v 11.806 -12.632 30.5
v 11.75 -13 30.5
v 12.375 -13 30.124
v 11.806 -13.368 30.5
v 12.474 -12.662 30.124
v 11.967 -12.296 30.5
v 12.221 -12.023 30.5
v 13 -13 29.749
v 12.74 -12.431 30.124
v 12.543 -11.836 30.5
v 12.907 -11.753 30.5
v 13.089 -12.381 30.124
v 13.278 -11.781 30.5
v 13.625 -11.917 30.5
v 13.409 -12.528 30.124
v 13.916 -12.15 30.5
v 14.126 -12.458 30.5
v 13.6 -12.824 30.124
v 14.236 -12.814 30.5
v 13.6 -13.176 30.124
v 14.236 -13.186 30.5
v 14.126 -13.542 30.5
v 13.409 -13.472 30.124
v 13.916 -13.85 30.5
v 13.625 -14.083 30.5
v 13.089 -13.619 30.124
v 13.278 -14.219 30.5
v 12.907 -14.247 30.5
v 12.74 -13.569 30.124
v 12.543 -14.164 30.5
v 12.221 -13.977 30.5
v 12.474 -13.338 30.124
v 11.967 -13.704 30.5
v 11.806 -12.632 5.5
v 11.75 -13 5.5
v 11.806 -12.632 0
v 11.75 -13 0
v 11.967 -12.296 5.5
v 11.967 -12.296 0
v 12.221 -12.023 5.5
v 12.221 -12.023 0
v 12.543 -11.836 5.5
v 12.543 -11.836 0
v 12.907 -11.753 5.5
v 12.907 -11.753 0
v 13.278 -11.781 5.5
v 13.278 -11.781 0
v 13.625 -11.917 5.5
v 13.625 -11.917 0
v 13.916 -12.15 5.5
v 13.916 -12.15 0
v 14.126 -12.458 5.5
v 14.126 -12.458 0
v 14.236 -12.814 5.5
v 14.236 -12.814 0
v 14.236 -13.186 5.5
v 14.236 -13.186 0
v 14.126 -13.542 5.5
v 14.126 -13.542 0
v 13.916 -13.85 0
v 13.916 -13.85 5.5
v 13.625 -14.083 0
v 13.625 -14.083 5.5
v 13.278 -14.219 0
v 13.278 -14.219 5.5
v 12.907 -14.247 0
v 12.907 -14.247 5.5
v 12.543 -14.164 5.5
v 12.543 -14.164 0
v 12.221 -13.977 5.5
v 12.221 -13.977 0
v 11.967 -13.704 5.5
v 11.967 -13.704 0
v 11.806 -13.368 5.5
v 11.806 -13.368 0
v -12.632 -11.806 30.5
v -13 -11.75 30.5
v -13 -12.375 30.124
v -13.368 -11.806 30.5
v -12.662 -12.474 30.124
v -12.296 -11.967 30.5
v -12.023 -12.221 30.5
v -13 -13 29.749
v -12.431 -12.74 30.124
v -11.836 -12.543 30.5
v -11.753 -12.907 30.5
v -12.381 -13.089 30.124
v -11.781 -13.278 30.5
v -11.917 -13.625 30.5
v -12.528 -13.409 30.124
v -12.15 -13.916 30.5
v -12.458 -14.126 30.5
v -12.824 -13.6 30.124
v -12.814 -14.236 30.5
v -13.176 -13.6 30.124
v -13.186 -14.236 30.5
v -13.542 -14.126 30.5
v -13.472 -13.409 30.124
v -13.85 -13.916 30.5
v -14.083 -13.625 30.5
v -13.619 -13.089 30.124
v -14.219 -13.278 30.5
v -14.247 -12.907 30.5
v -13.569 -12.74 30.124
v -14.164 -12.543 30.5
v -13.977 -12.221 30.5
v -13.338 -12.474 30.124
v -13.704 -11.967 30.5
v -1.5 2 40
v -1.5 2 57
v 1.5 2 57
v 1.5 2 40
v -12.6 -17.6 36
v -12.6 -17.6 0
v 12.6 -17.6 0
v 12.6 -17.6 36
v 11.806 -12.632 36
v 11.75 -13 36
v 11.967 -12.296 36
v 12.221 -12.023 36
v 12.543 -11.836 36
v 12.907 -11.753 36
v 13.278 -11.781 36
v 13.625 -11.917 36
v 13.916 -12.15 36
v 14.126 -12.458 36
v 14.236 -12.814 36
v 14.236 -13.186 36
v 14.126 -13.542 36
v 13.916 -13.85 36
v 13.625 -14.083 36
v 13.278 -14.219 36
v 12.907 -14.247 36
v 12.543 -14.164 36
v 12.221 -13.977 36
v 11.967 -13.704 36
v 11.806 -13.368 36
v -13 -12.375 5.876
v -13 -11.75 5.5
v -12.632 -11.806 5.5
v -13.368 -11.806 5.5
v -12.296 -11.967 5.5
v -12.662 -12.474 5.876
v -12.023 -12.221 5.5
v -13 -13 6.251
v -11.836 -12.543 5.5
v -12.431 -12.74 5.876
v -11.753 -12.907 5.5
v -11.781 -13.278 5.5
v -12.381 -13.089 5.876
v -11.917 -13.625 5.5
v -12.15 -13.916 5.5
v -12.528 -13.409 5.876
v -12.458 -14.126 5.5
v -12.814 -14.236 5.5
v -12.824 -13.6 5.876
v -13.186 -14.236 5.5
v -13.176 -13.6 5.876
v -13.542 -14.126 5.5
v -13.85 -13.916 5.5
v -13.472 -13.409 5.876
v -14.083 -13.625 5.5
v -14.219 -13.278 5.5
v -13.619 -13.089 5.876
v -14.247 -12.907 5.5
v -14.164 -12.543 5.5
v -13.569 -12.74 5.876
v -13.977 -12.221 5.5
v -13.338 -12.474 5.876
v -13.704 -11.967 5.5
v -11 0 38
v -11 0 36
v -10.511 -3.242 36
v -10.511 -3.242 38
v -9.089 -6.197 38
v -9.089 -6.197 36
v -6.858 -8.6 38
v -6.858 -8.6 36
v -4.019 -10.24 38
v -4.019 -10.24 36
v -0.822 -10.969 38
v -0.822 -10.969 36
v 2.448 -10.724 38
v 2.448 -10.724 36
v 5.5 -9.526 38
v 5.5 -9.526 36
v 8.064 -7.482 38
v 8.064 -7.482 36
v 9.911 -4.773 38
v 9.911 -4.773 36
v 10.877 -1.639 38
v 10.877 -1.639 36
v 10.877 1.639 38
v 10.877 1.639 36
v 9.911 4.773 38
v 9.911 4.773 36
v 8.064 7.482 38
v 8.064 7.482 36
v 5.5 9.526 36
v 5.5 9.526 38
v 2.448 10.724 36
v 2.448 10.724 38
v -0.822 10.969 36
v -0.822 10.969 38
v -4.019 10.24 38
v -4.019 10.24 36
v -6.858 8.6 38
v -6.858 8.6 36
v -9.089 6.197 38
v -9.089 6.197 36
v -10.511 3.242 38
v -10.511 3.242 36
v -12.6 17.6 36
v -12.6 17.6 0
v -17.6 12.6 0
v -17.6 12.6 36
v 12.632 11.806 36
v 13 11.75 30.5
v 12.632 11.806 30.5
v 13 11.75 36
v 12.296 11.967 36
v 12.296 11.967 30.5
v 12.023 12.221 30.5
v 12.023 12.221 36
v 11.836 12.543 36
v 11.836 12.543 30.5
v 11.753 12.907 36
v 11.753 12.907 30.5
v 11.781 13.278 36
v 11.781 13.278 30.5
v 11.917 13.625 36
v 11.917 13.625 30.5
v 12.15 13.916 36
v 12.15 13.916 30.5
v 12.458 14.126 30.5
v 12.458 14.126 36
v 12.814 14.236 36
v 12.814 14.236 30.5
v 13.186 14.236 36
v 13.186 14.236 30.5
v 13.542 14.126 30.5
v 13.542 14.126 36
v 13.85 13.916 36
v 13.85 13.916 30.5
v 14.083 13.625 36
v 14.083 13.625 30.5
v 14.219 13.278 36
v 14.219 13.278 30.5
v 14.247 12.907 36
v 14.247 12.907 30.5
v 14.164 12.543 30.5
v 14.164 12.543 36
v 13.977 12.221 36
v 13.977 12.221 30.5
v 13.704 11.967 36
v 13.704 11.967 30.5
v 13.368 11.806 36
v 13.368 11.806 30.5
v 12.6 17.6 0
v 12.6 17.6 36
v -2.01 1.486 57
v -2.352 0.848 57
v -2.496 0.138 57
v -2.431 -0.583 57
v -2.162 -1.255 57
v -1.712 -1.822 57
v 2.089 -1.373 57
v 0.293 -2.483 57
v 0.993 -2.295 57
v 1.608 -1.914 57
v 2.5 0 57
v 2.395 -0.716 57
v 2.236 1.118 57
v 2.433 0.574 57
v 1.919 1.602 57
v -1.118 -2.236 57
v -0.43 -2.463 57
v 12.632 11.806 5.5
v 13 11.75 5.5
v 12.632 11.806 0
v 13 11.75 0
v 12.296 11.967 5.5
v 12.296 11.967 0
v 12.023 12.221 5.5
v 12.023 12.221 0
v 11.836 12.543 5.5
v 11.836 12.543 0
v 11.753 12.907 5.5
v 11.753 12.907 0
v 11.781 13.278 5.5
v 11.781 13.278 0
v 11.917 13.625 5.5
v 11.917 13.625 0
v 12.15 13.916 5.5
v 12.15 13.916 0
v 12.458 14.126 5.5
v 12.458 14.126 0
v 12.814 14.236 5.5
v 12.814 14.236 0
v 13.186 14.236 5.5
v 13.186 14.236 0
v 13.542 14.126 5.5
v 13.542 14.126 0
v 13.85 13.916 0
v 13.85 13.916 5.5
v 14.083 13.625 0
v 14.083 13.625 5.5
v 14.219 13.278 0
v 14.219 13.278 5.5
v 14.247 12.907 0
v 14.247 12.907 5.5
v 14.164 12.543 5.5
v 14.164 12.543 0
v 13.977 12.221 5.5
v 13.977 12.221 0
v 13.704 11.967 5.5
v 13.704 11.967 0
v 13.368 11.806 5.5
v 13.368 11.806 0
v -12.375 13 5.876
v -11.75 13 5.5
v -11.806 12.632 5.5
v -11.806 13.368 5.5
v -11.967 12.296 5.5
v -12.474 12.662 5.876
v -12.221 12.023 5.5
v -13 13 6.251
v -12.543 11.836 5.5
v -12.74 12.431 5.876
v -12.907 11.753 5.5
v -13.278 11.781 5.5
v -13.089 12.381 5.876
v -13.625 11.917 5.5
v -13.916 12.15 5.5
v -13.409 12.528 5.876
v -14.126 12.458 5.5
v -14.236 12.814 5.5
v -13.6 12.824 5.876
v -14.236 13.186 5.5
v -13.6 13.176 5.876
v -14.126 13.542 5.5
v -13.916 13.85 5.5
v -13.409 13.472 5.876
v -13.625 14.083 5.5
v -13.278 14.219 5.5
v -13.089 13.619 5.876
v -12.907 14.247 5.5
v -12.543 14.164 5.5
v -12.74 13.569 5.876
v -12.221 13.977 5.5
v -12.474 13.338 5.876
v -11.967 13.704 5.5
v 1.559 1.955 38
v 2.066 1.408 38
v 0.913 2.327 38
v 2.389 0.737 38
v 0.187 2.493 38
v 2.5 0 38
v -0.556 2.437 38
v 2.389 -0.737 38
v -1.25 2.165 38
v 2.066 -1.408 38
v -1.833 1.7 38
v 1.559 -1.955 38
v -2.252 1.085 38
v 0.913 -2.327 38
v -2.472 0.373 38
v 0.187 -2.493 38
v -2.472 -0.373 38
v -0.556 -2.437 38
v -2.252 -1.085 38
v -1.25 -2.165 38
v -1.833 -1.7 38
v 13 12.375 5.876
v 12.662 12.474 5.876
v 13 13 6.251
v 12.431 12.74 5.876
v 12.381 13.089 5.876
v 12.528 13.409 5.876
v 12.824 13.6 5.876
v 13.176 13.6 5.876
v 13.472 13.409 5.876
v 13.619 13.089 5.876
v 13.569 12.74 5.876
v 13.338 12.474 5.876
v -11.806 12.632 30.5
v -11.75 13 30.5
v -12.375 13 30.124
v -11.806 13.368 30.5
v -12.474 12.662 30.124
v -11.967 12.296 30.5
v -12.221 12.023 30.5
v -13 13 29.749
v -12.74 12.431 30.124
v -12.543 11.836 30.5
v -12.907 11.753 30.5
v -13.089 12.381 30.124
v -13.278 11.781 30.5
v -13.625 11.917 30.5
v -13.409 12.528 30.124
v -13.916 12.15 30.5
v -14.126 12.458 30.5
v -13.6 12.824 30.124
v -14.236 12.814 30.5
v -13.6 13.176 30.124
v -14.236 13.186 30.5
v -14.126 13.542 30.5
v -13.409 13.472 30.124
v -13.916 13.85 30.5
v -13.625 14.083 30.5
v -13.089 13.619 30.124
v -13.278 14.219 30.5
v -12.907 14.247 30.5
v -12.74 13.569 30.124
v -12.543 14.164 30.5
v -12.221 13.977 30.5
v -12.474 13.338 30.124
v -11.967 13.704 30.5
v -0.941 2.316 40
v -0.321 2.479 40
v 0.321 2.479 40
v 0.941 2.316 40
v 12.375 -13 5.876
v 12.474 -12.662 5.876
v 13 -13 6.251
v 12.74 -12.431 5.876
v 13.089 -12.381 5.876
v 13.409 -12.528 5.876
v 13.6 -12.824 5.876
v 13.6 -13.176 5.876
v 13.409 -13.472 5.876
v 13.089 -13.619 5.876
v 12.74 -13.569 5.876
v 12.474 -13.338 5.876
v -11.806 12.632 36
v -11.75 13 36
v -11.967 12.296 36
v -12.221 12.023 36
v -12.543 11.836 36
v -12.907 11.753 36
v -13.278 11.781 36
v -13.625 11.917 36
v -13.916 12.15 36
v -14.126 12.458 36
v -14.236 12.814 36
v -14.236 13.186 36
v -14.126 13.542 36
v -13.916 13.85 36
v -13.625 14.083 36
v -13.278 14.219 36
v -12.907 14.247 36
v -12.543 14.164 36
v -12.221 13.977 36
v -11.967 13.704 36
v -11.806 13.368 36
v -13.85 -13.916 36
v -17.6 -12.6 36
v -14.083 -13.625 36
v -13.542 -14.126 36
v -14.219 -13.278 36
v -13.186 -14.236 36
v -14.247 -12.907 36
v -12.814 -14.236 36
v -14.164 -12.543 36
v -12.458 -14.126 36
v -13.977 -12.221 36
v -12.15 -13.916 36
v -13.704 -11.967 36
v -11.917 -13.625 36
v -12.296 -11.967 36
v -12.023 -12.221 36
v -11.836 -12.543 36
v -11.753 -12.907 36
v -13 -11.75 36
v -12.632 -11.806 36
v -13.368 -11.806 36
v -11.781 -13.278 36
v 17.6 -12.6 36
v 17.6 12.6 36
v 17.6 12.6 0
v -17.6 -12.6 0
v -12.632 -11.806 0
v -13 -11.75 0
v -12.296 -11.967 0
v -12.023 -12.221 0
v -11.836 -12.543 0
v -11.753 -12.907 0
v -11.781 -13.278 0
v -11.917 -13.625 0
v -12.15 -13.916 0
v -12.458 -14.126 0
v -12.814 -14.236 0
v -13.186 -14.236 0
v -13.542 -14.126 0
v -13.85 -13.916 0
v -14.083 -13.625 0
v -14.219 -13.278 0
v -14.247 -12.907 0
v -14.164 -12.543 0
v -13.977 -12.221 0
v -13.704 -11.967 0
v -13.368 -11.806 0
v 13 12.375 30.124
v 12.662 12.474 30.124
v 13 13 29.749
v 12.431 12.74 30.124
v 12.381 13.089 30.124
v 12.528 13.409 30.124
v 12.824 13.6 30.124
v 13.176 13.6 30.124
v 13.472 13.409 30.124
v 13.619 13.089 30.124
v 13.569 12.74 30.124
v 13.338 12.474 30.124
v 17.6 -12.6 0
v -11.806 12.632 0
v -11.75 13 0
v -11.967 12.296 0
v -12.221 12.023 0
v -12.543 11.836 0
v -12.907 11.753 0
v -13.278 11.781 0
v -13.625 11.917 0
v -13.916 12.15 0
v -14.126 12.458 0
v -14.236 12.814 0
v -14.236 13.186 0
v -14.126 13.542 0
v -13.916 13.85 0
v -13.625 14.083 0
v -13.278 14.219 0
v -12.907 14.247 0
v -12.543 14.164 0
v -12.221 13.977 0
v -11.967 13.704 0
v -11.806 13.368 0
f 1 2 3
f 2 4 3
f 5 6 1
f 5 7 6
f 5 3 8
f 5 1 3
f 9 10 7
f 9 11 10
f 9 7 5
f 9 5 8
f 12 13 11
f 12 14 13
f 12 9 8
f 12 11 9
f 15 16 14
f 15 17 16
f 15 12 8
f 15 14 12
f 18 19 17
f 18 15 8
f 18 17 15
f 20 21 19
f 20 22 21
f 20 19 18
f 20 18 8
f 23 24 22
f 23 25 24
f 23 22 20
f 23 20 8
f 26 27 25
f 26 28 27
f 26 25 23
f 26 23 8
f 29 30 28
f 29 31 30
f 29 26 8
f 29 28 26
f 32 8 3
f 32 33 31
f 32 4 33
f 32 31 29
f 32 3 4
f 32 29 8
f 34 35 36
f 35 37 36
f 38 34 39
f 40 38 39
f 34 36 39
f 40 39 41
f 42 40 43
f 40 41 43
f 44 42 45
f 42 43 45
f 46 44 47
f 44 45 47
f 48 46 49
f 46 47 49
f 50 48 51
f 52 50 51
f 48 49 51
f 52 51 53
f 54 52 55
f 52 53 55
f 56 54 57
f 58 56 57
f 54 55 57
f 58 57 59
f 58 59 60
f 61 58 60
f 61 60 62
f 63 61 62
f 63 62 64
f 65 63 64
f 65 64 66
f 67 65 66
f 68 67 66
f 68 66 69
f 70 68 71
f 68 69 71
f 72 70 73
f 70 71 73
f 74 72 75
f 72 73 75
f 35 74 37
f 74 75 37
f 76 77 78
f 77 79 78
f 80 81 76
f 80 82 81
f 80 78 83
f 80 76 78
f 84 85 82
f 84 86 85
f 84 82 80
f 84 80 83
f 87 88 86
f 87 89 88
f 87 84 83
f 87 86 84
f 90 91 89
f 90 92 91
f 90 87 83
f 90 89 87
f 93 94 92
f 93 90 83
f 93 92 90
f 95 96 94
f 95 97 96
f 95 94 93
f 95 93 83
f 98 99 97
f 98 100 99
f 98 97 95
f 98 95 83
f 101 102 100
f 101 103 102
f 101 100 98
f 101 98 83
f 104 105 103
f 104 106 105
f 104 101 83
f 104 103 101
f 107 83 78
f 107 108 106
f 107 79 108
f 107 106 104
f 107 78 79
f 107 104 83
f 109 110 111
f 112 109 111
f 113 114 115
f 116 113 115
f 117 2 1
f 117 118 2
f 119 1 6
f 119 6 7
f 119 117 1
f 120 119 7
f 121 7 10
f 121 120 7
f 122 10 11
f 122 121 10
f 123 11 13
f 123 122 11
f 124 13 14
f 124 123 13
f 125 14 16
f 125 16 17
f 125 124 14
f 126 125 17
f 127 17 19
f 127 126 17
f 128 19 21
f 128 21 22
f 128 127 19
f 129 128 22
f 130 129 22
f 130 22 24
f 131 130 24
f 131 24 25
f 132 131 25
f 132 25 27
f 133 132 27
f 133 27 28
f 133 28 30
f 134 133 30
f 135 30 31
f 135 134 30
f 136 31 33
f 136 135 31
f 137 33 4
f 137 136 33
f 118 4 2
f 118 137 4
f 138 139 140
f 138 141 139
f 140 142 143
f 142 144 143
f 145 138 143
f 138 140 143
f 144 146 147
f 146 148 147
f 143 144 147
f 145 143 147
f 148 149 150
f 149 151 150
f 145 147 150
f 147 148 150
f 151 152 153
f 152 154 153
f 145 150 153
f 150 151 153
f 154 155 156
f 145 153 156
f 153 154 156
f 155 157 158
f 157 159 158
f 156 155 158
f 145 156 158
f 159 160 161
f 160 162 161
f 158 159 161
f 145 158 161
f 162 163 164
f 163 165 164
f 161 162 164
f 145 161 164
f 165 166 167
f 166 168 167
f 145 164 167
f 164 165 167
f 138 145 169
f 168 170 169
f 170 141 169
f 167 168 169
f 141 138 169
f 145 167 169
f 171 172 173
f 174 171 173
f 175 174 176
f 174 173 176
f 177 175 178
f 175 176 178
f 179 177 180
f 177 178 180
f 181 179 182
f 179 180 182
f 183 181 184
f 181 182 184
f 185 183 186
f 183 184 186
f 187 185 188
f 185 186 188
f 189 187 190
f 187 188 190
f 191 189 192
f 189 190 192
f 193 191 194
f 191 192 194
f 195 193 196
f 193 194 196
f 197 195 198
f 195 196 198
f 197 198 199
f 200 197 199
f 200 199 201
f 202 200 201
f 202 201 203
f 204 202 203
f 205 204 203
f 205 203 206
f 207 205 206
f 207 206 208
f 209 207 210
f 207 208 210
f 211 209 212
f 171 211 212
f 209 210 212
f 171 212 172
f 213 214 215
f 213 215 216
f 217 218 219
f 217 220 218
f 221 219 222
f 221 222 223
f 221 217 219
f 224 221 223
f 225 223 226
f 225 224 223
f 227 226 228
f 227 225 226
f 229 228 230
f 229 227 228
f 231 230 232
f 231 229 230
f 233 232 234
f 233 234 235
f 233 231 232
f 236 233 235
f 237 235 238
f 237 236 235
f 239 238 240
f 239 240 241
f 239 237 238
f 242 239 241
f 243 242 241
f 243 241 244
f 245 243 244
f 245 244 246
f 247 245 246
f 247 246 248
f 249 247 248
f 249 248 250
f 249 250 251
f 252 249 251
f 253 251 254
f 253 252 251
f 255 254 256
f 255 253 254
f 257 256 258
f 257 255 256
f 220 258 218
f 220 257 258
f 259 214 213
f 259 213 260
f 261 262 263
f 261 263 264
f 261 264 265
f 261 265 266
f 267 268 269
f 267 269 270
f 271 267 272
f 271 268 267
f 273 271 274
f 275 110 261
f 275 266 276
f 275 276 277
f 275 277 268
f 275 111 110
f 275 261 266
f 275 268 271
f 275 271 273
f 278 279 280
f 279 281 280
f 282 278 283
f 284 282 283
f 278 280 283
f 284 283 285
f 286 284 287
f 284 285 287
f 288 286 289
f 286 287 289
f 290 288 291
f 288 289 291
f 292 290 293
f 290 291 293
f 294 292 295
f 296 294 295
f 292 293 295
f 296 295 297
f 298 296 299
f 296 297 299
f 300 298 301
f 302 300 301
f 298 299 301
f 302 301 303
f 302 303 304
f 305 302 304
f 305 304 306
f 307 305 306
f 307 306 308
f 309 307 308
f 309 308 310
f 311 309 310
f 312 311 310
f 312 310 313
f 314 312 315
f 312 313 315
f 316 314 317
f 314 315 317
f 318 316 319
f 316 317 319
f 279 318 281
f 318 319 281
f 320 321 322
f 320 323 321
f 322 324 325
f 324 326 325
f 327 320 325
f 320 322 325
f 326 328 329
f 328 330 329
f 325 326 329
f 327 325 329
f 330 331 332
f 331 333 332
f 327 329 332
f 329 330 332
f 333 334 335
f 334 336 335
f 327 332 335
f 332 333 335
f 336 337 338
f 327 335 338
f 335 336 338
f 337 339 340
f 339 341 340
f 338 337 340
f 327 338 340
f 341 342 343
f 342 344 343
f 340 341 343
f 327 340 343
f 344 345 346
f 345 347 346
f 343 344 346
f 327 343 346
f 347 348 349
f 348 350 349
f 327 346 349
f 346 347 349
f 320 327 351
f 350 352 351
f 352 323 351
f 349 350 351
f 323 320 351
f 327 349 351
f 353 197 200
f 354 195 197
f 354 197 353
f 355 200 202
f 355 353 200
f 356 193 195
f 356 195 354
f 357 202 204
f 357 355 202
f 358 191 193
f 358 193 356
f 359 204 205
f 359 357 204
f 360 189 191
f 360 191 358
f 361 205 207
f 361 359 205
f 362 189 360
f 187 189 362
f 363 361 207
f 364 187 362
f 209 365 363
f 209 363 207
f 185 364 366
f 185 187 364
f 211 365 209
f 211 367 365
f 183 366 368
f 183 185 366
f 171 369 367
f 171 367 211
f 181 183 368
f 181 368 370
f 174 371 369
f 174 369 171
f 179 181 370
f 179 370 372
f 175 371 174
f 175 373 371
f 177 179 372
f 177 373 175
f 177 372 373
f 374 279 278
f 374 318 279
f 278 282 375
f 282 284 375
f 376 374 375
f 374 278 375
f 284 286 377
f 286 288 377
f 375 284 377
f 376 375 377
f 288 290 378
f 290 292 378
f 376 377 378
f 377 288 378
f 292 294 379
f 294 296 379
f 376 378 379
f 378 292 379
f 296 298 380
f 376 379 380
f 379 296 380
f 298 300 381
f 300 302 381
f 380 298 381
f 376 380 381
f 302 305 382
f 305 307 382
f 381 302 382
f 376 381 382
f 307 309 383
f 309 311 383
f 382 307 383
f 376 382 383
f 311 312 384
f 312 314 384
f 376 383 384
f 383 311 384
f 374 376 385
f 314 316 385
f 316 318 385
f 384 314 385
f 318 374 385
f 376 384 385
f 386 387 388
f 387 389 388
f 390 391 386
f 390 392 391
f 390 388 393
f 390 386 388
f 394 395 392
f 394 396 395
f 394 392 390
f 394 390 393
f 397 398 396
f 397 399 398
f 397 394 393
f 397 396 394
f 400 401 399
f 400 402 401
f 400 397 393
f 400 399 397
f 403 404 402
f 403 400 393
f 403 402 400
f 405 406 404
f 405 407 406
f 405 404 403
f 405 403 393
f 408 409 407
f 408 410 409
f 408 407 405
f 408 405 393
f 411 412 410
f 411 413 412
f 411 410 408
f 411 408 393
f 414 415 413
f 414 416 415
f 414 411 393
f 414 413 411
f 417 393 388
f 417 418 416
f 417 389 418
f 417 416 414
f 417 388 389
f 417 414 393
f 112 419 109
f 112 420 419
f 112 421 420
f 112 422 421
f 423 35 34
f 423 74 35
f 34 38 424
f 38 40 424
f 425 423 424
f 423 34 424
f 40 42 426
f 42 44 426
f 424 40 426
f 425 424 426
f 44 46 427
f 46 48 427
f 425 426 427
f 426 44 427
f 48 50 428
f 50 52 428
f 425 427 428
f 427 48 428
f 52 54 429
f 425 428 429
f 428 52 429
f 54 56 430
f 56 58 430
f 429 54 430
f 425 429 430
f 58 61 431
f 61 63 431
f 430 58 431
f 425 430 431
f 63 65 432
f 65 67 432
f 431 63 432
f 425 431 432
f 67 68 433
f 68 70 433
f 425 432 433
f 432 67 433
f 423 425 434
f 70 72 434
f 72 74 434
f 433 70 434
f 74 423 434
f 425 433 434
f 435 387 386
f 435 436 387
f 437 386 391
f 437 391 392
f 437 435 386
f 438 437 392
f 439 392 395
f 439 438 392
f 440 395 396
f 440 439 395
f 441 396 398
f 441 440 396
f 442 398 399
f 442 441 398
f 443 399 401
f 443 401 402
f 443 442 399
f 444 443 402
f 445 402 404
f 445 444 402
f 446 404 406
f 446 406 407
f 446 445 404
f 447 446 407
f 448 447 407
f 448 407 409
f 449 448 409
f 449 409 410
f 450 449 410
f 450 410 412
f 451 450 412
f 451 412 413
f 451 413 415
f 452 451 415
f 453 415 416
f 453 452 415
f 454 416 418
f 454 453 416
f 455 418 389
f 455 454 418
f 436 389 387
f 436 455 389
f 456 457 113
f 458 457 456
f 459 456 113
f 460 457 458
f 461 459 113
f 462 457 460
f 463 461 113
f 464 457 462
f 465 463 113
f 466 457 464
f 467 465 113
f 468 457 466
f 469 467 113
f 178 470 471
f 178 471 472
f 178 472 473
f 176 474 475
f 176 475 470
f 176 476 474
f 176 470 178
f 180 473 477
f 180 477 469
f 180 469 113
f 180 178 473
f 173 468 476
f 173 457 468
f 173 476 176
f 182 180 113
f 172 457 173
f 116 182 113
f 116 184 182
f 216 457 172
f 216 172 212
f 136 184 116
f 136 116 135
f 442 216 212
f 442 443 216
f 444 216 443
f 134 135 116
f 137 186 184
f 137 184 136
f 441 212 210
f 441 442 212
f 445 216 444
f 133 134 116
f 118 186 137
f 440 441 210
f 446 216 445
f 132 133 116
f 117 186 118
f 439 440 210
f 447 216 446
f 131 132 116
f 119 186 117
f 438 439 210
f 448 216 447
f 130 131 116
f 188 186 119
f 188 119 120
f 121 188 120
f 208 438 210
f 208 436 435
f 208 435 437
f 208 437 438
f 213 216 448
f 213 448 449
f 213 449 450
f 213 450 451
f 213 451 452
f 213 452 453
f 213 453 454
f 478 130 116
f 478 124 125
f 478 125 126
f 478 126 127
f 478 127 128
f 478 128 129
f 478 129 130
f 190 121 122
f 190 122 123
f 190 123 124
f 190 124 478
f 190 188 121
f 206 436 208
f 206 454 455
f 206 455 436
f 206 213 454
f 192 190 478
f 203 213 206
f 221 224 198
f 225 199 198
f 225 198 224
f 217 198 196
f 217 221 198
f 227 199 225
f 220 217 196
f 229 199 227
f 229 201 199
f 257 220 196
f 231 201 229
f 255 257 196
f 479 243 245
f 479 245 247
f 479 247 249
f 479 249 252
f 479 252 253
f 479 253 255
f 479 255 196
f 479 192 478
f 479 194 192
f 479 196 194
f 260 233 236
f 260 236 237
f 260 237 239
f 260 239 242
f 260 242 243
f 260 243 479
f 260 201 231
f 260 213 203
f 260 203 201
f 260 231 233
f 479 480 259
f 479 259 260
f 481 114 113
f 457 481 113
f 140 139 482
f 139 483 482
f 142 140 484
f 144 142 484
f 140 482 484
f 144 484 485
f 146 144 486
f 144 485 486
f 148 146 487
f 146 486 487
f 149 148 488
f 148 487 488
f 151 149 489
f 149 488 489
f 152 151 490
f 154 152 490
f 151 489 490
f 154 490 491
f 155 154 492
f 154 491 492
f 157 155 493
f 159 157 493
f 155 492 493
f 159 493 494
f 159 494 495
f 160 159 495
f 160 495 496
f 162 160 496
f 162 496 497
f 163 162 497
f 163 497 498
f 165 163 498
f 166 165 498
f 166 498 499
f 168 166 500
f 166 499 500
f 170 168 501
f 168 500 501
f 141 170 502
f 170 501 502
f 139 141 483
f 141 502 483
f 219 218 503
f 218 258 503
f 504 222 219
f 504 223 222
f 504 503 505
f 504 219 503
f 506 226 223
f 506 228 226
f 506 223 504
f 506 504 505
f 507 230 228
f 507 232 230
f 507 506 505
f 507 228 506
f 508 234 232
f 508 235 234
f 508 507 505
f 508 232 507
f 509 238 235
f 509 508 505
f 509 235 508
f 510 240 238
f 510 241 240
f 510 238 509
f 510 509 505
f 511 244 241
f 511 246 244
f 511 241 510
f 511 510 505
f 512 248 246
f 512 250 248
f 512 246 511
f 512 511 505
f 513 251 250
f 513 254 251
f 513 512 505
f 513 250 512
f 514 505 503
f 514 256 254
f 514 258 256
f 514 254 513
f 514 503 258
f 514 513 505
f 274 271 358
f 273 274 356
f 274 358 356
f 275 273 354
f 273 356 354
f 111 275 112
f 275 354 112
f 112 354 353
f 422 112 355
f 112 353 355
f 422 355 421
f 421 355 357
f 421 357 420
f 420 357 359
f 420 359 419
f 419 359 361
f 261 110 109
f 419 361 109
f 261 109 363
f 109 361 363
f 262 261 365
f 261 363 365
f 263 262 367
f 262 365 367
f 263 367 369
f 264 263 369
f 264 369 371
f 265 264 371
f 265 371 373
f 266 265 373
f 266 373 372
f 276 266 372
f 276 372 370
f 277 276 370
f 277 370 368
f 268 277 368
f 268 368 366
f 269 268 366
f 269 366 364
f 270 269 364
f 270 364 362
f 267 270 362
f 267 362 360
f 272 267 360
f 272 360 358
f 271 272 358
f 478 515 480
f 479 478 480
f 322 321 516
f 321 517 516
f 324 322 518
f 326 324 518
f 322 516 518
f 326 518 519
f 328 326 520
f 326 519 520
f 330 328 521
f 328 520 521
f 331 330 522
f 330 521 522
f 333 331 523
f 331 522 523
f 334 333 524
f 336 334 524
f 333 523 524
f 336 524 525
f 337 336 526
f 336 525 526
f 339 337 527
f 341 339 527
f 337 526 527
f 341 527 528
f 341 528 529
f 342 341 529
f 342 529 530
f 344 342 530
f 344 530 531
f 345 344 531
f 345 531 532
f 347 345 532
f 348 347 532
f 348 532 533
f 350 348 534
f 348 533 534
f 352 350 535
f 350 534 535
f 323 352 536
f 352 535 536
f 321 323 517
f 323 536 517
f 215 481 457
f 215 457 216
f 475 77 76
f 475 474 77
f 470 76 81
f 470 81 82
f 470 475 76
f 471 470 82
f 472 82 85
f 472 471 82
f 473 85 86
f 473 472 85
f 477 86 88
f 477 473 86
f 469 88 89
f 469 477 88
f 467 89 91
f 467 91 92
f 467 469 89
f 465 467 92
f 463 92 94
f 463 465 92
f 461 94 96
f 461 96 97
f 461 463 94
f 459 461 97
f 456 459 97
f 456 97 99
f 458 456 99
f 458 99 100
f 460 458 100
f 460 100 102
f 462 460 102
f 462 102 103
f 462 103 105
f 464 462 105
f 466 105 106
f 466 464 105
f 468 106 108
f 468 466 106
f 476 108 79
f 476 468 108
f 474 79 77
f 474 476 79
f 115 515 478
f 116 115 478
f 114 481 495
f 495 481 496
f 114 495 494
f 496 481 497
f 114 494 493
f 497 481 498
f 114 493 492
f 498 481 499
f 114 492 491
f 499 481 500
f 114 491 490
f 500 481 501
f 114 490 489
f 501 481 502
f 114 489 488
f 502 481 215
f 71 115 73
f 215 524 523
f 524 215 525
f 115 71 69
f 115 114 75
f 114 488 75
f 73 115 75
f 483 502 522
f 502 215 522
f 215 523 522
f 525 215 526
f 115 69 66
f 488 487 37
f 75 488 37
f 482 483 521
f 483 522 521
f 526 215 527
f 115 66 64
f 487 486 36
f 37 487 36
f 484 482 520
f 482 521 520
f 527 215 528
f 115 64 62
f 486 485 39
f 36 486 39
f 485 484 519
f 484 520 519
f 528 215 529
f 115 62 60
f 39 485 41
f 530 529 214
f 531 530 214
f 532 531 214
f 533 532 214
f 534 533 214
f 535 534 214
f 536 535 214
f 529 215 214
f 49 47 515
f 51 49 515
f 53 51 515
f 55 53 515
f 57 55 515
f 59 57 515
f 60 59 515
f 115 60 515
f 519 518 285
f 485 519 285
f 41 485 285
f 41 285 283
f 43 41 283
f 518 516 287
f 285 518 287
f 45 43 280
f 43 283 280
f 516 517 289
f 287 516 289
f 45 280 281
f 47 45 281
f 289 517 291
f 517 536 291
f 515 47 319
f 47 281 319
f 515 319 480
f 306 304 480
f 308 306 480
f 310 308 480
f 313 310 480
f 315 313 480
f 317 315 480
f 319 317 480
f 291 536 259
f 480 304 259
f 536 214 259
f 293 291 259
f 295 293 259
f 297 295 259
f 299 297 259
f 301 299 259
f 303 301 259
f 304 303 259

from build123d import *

# Parameters (mm, degrees)
SKETCH1_W           = 35.2
SKETCH1_H           = 35.2
BOSS_EXTRUDE1_DEPTH = 36
SKETCH2_R           = 11
BOSS_EXTRUDE2_DEPTH = 2
SKETCH3_R           = 2.5
BOSS_EXTRUDE3_DEPTH = 19
CHAMFER1_SIZE       = 5
CIRPATTERN1_COUNT   = 4
SKETCH6_W           = 4.502968974
SKETCH6_H           = 1.338593798
CUT_EXTRUDE1_DEPTH  = 17


with BuildPart() as part:
    # Sketch1 → Boss-Extrude1 (new body)
    with BuildSketch(Plane.XY):
        Rectangle(SKETCH1_W, SKETCH1_H)
    extrude(amount=BOSS_EXTRUDE1_DEPTH)

    # Sketch2 → Boss-Extrude2 (add)
    with BuildSketch(Plane.XY.offset(36)):
        with Locations(Location((0, 0, 0), (0, 0, 180))):
            Circle(SKETCH2_R)
    extrude(amount=BOSS_EXTRUDE2_DEPTH)

    # Sketch3 → Boss-Extrude3 (add)
    with BuildSketch(Plane.XY.offset(38)):
        Circle(SKETCH3_R)
    extrude(amount=BOSS_EXTRUDE3_DEPTH)

    # Chamfer1
    chamfer1_edges = [part.edges().sort_by_distance(p)[0] for p in [
        (-17.6, 17.6, 18),
        (17.6, 17.6, 18),
        (17.6, -17.6, 18),
        (-17.6, -17.6, 18),
    ]]
    chamfer(chamfer1_edges, length=CHAMFER1_SIZE)

    # Sketch4 → M3x0.5 Tapped Hole1 (revolve, cut)
    with BuildSketch(Plane(origin=(13, 13, 36), x_dir=(0, -1, 0), z_dir=(1, 0, 0))):
        Polygon((0, 0), (0, 6.251075774), (1.25, 5.5), (1.25, 0), align=None)
    m3x0_5_tapped_hole1 = revolve(axis=Axis((13, 13, 42.35), (0, 0, -1)), mode=Mode.SUBTRACT)

    # CirPattern1: M3x0.5 Tapped Hole1 ×4 about axis
    cirpattern1_axis = Axis((0, 0, 0), (0, 0, 1))
    for i in range(1, CIRPATTERN1_COUNT):
        add(m3x0_5_tapped_hole1.rotate(cirpattern1_axis, i * 360 / CIRPATTERN1_COUNT), mode=Mode.SUBTRACT)

    # Sketch6 → Cut-Extrude1 (cut)
    with BuildSketch(Plane.XY.offset(57)):
        with Locations((-0.129996357, 2.669296899)):
            Rectangle(SKETCH6_W, SKETCH6_H)
    extrude(amount=-CUT_EXTRUDE1_DEPTH, mode=Mode.SUBTRACT)

    # Mirror1: M3x0.5 Tapped Hole1 across plane
    add(m3x0_5_tapped_hole1.mirror(Plane(origin=(0, 0, 18), x_dir=(1, 0, 0), z_dir=(0, 0, -1))), mode=Mode.SUBTRACT)

    # Mirror1 copy 1 sketch → Mirror1 copy 1 (revolve, cut)
    with BuildSketch(Plane(origin=(-13, 13, 0), x_dir=(1, 0, 0), z_dir=(0, 1, 0))):
        Polygon((0, 0), (0, -6.251075774), (1.25, -5.5), (1.25, 0), align=None)
    revolve(axis=Axis((-13, 13, -6.35), (0, 0, -1)), mode=Mode.SUBTRACT)

    # Mirror1 copy 2 sketch → Mirror1 copy 2 (revolve, cut)
    with BuildSketch(Plane(origin=(-13, -13, 0), x_dir=(0, 1, 0), z_dir=(-1, 0, 0))):
        Polygon((0, 0), (0, -6.251075774), (1.25, -5.5), (1.25, 0), align=None)
    revolve(axis=Axis((-13, -13, -6.35), (0, 0, -1)), mode=Mode.SUBTRACT)

    # Mirror1 copy 3 sketch → Mirror1 copy 3 (revolve, cut)
    with BuildSketch(Plane(origin=(13, -13, 0), x_dir=(-1, 0, 0), z_dir=(0, -1, 0))):
        Polygon((0, 0), (0, -6.251075774), (1.25, -5.5), (1.25, 0), align=None)
    revolve(axis=Axis((13, -13, -6.35), (0, 0, -1)), mode=Mode.SUBTRACT)


solid = part.part
